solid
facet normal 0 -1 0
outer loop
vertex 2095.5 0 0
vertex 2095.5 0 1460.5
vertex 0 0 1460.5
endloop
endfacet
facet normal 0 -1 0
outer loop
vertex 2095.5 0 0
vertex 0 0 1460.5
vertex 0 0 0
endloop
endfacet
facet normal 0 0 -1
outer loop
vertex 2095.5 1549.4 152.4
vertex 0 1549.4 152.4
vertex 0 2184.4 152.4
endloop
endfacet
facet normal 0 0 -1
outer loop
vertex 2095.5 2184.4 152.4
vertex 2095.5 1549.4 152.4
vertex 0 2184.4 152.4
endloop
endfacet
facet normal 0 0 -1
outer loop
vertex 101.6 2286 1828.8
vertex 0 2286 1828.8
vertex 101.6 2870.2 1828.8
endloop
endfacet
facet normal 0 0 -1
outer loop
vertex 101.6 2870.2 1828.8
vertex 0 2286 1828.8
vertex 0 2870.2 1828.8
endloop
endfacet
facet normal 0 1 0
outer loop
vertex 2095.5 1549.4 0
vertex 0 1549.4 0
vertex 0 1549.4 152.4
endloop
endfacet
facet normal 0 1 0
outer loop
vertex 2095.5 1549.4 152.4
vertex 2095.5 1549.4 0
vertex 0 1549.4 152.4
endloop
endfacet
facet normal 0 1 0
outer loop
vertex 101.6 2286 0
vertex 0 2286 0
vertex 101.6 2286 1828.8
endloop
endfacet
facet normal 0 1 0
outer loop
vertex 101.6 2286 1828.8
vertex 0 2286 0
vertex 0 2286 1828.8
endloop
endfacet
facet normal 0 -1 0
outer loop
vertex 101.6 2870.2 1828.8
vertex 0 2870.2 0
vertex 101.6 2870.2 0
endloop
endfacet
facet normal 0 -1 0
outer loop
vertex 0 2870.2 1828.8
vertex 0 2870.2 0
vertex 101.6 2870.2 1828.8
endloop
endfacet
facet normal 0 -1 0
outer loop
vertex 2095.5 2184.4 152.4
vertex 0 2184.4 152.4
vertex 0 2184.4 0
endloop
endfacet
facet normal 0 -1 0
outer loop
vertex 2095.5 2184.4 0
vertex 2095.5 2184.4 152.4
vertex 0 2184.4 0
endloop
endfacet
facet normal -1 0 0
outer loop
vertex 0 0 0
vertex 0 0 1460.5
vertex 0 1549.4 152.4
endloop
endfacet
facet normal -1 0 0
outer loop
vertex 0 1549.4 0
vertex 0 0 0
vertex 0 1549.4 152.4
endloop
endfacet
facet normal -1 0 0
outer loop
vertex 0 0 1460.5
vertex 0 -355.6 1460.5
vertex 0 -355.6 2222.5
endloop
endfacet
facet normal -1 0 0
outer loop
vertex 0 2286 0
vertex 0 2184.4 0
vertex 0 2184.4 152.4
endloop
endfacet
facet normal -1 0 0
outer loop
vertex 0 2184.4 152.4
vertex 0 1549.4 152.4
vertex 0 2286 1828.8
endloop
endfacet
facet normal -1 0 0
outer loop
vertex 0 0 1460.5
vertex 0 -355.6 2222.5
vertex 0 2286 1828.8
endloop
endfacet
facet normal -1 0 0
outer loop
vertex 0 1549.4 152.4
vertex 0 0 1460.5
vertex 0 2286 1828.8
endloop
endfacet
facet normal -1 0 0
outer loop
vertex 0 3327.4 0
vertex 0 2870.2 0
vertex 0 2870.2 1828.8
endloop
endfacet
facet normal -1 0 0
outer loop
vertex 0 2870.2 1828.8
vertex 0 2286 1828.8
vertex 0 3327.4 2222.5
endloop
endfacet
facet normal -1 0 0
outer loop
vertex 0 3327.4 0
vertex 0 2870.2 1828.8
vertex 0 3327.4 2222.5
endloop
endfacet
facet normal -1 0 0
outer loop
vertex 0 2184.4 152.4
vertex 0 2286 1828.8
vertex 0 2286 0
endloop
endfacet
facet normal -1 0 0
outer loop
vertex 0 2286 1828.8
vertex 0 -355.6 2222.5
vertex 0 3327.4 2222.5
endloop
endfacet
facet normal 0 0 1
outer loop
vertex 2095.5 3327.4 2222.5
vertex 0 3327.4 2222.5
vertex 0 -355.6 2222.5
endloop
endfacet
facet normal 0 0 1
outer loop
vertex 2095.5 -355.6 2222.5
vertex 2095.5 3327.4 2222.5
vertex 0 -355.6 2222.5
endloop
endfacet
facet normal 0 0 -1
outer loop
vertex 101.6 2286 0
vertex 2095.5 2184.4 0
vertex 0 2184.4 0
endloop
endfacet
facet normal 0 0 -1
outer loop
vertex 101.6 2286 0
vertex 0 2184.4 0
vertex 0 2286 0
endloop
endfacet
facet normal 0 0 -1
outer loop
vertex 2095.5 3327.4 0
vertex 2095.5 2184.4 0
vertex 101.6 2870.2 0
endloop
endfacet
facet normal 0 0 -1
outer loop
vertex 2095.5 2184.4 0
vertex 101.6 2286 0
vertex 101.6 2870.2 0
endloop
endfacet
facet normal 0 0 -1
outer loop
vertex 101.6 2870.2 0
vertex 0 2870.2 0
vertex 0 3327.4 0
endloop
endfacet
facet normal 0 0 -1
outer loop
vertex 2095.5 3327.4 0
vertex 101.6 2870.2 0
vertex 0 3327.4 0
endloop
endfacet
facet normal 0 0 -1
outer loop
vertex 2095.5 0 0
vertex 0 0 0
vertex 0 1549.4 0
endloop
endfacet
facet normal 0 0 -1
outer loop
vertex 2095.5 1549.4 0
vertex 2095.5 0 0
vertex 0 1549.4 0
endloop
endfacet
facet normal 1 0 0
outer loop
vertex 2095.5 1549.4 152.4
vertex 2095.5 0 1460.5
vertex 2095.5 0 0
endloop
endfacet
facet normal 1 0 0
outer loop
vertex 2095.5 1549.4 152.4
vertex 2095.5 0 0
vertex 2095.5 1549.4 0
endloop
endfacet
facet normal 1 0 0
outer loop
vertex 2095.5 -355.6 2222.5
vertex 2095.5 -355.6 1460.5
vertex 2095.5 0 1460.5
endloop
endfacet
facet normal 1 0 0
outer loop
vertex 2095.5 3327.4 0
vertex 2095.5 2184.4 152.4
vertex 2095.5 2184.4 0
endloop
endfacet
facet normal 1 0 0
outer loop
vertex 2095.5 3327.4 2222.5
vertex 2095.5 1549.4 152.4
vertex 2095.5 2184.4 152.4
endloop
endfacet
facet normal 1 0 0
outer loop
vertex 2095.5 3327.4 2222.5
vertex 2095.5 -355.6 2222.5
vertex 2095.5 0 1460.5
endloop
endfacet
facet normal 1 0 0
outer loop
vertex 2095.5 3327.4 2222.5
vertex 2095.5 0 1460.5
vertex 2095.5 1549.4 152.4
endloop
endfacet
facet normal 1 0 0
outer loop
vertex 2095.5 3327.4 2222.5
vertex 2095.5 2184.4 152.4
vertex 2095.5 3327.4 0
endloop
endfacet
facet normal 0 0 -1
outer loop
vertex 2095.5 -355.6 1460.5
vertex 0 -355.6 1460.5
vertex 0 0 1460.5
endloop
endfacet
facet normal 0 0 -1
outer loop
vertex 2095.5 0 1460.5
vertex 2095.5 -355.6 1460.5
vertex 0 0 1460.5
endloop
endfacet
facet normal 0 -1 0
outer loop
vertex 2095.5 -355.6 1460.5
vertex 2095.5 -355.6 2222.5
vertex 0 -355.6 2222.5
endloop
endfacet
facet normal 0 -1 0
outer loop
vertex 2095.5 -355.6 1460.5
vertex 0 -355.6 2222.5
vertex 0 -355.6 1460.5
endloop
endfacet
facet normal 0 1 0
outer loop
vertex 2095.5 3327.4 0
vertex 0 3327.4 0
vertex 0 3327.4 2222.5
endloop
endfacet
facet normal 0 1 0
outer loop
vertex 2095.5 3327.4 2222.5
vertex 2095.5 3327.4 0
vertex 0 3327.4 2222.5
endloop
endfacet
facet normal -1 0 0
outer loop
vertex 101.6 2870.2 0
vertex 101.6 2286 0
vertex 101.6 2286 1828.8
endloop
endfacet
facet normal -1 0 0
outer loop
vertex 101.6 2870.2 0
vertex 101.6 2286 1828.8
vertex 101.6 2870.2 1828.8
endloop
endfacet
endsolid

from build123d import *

# Parameters (mm, degrees)
F0_W     = 584.2
F0_H     = 1828.8
F1_DEPTH = 2095.5
F2_DEPTH = 101.6


with BuildPart() as f1:
    # F0 (on Right) → F1 (new body)
    with BuildSketch(Plane.YZ):
        Polygon((0, 1460.5), (0, 0), (1549.4, 0), (1549.4, 152.4), (2184.4, 152.4), (2184.4, 0), (2286, 0), (2286, 1828.8), (2870.2, 1828.8), (2870.2, 0), (3327.4, 0), (3327.4, 2222.5), (-355.6, 2222.5), (-355.6, 1460.5), align=None)
        with Locations((2578.1, 914.4)):
            Rectangle(F0_W, F0_H)
    extrude(amount=F1_DEPTH)

    # F0 (on Right) → F2 (cut)
    with BuildSketch(Plane.YZ):
        with Locations((2578.1, 914.4)):
            Rectangle(F0_W, F0_H)
    extrude(amount=F2_DEPTH, mode=Mode.SUBTRACT)


solid = f1.part
